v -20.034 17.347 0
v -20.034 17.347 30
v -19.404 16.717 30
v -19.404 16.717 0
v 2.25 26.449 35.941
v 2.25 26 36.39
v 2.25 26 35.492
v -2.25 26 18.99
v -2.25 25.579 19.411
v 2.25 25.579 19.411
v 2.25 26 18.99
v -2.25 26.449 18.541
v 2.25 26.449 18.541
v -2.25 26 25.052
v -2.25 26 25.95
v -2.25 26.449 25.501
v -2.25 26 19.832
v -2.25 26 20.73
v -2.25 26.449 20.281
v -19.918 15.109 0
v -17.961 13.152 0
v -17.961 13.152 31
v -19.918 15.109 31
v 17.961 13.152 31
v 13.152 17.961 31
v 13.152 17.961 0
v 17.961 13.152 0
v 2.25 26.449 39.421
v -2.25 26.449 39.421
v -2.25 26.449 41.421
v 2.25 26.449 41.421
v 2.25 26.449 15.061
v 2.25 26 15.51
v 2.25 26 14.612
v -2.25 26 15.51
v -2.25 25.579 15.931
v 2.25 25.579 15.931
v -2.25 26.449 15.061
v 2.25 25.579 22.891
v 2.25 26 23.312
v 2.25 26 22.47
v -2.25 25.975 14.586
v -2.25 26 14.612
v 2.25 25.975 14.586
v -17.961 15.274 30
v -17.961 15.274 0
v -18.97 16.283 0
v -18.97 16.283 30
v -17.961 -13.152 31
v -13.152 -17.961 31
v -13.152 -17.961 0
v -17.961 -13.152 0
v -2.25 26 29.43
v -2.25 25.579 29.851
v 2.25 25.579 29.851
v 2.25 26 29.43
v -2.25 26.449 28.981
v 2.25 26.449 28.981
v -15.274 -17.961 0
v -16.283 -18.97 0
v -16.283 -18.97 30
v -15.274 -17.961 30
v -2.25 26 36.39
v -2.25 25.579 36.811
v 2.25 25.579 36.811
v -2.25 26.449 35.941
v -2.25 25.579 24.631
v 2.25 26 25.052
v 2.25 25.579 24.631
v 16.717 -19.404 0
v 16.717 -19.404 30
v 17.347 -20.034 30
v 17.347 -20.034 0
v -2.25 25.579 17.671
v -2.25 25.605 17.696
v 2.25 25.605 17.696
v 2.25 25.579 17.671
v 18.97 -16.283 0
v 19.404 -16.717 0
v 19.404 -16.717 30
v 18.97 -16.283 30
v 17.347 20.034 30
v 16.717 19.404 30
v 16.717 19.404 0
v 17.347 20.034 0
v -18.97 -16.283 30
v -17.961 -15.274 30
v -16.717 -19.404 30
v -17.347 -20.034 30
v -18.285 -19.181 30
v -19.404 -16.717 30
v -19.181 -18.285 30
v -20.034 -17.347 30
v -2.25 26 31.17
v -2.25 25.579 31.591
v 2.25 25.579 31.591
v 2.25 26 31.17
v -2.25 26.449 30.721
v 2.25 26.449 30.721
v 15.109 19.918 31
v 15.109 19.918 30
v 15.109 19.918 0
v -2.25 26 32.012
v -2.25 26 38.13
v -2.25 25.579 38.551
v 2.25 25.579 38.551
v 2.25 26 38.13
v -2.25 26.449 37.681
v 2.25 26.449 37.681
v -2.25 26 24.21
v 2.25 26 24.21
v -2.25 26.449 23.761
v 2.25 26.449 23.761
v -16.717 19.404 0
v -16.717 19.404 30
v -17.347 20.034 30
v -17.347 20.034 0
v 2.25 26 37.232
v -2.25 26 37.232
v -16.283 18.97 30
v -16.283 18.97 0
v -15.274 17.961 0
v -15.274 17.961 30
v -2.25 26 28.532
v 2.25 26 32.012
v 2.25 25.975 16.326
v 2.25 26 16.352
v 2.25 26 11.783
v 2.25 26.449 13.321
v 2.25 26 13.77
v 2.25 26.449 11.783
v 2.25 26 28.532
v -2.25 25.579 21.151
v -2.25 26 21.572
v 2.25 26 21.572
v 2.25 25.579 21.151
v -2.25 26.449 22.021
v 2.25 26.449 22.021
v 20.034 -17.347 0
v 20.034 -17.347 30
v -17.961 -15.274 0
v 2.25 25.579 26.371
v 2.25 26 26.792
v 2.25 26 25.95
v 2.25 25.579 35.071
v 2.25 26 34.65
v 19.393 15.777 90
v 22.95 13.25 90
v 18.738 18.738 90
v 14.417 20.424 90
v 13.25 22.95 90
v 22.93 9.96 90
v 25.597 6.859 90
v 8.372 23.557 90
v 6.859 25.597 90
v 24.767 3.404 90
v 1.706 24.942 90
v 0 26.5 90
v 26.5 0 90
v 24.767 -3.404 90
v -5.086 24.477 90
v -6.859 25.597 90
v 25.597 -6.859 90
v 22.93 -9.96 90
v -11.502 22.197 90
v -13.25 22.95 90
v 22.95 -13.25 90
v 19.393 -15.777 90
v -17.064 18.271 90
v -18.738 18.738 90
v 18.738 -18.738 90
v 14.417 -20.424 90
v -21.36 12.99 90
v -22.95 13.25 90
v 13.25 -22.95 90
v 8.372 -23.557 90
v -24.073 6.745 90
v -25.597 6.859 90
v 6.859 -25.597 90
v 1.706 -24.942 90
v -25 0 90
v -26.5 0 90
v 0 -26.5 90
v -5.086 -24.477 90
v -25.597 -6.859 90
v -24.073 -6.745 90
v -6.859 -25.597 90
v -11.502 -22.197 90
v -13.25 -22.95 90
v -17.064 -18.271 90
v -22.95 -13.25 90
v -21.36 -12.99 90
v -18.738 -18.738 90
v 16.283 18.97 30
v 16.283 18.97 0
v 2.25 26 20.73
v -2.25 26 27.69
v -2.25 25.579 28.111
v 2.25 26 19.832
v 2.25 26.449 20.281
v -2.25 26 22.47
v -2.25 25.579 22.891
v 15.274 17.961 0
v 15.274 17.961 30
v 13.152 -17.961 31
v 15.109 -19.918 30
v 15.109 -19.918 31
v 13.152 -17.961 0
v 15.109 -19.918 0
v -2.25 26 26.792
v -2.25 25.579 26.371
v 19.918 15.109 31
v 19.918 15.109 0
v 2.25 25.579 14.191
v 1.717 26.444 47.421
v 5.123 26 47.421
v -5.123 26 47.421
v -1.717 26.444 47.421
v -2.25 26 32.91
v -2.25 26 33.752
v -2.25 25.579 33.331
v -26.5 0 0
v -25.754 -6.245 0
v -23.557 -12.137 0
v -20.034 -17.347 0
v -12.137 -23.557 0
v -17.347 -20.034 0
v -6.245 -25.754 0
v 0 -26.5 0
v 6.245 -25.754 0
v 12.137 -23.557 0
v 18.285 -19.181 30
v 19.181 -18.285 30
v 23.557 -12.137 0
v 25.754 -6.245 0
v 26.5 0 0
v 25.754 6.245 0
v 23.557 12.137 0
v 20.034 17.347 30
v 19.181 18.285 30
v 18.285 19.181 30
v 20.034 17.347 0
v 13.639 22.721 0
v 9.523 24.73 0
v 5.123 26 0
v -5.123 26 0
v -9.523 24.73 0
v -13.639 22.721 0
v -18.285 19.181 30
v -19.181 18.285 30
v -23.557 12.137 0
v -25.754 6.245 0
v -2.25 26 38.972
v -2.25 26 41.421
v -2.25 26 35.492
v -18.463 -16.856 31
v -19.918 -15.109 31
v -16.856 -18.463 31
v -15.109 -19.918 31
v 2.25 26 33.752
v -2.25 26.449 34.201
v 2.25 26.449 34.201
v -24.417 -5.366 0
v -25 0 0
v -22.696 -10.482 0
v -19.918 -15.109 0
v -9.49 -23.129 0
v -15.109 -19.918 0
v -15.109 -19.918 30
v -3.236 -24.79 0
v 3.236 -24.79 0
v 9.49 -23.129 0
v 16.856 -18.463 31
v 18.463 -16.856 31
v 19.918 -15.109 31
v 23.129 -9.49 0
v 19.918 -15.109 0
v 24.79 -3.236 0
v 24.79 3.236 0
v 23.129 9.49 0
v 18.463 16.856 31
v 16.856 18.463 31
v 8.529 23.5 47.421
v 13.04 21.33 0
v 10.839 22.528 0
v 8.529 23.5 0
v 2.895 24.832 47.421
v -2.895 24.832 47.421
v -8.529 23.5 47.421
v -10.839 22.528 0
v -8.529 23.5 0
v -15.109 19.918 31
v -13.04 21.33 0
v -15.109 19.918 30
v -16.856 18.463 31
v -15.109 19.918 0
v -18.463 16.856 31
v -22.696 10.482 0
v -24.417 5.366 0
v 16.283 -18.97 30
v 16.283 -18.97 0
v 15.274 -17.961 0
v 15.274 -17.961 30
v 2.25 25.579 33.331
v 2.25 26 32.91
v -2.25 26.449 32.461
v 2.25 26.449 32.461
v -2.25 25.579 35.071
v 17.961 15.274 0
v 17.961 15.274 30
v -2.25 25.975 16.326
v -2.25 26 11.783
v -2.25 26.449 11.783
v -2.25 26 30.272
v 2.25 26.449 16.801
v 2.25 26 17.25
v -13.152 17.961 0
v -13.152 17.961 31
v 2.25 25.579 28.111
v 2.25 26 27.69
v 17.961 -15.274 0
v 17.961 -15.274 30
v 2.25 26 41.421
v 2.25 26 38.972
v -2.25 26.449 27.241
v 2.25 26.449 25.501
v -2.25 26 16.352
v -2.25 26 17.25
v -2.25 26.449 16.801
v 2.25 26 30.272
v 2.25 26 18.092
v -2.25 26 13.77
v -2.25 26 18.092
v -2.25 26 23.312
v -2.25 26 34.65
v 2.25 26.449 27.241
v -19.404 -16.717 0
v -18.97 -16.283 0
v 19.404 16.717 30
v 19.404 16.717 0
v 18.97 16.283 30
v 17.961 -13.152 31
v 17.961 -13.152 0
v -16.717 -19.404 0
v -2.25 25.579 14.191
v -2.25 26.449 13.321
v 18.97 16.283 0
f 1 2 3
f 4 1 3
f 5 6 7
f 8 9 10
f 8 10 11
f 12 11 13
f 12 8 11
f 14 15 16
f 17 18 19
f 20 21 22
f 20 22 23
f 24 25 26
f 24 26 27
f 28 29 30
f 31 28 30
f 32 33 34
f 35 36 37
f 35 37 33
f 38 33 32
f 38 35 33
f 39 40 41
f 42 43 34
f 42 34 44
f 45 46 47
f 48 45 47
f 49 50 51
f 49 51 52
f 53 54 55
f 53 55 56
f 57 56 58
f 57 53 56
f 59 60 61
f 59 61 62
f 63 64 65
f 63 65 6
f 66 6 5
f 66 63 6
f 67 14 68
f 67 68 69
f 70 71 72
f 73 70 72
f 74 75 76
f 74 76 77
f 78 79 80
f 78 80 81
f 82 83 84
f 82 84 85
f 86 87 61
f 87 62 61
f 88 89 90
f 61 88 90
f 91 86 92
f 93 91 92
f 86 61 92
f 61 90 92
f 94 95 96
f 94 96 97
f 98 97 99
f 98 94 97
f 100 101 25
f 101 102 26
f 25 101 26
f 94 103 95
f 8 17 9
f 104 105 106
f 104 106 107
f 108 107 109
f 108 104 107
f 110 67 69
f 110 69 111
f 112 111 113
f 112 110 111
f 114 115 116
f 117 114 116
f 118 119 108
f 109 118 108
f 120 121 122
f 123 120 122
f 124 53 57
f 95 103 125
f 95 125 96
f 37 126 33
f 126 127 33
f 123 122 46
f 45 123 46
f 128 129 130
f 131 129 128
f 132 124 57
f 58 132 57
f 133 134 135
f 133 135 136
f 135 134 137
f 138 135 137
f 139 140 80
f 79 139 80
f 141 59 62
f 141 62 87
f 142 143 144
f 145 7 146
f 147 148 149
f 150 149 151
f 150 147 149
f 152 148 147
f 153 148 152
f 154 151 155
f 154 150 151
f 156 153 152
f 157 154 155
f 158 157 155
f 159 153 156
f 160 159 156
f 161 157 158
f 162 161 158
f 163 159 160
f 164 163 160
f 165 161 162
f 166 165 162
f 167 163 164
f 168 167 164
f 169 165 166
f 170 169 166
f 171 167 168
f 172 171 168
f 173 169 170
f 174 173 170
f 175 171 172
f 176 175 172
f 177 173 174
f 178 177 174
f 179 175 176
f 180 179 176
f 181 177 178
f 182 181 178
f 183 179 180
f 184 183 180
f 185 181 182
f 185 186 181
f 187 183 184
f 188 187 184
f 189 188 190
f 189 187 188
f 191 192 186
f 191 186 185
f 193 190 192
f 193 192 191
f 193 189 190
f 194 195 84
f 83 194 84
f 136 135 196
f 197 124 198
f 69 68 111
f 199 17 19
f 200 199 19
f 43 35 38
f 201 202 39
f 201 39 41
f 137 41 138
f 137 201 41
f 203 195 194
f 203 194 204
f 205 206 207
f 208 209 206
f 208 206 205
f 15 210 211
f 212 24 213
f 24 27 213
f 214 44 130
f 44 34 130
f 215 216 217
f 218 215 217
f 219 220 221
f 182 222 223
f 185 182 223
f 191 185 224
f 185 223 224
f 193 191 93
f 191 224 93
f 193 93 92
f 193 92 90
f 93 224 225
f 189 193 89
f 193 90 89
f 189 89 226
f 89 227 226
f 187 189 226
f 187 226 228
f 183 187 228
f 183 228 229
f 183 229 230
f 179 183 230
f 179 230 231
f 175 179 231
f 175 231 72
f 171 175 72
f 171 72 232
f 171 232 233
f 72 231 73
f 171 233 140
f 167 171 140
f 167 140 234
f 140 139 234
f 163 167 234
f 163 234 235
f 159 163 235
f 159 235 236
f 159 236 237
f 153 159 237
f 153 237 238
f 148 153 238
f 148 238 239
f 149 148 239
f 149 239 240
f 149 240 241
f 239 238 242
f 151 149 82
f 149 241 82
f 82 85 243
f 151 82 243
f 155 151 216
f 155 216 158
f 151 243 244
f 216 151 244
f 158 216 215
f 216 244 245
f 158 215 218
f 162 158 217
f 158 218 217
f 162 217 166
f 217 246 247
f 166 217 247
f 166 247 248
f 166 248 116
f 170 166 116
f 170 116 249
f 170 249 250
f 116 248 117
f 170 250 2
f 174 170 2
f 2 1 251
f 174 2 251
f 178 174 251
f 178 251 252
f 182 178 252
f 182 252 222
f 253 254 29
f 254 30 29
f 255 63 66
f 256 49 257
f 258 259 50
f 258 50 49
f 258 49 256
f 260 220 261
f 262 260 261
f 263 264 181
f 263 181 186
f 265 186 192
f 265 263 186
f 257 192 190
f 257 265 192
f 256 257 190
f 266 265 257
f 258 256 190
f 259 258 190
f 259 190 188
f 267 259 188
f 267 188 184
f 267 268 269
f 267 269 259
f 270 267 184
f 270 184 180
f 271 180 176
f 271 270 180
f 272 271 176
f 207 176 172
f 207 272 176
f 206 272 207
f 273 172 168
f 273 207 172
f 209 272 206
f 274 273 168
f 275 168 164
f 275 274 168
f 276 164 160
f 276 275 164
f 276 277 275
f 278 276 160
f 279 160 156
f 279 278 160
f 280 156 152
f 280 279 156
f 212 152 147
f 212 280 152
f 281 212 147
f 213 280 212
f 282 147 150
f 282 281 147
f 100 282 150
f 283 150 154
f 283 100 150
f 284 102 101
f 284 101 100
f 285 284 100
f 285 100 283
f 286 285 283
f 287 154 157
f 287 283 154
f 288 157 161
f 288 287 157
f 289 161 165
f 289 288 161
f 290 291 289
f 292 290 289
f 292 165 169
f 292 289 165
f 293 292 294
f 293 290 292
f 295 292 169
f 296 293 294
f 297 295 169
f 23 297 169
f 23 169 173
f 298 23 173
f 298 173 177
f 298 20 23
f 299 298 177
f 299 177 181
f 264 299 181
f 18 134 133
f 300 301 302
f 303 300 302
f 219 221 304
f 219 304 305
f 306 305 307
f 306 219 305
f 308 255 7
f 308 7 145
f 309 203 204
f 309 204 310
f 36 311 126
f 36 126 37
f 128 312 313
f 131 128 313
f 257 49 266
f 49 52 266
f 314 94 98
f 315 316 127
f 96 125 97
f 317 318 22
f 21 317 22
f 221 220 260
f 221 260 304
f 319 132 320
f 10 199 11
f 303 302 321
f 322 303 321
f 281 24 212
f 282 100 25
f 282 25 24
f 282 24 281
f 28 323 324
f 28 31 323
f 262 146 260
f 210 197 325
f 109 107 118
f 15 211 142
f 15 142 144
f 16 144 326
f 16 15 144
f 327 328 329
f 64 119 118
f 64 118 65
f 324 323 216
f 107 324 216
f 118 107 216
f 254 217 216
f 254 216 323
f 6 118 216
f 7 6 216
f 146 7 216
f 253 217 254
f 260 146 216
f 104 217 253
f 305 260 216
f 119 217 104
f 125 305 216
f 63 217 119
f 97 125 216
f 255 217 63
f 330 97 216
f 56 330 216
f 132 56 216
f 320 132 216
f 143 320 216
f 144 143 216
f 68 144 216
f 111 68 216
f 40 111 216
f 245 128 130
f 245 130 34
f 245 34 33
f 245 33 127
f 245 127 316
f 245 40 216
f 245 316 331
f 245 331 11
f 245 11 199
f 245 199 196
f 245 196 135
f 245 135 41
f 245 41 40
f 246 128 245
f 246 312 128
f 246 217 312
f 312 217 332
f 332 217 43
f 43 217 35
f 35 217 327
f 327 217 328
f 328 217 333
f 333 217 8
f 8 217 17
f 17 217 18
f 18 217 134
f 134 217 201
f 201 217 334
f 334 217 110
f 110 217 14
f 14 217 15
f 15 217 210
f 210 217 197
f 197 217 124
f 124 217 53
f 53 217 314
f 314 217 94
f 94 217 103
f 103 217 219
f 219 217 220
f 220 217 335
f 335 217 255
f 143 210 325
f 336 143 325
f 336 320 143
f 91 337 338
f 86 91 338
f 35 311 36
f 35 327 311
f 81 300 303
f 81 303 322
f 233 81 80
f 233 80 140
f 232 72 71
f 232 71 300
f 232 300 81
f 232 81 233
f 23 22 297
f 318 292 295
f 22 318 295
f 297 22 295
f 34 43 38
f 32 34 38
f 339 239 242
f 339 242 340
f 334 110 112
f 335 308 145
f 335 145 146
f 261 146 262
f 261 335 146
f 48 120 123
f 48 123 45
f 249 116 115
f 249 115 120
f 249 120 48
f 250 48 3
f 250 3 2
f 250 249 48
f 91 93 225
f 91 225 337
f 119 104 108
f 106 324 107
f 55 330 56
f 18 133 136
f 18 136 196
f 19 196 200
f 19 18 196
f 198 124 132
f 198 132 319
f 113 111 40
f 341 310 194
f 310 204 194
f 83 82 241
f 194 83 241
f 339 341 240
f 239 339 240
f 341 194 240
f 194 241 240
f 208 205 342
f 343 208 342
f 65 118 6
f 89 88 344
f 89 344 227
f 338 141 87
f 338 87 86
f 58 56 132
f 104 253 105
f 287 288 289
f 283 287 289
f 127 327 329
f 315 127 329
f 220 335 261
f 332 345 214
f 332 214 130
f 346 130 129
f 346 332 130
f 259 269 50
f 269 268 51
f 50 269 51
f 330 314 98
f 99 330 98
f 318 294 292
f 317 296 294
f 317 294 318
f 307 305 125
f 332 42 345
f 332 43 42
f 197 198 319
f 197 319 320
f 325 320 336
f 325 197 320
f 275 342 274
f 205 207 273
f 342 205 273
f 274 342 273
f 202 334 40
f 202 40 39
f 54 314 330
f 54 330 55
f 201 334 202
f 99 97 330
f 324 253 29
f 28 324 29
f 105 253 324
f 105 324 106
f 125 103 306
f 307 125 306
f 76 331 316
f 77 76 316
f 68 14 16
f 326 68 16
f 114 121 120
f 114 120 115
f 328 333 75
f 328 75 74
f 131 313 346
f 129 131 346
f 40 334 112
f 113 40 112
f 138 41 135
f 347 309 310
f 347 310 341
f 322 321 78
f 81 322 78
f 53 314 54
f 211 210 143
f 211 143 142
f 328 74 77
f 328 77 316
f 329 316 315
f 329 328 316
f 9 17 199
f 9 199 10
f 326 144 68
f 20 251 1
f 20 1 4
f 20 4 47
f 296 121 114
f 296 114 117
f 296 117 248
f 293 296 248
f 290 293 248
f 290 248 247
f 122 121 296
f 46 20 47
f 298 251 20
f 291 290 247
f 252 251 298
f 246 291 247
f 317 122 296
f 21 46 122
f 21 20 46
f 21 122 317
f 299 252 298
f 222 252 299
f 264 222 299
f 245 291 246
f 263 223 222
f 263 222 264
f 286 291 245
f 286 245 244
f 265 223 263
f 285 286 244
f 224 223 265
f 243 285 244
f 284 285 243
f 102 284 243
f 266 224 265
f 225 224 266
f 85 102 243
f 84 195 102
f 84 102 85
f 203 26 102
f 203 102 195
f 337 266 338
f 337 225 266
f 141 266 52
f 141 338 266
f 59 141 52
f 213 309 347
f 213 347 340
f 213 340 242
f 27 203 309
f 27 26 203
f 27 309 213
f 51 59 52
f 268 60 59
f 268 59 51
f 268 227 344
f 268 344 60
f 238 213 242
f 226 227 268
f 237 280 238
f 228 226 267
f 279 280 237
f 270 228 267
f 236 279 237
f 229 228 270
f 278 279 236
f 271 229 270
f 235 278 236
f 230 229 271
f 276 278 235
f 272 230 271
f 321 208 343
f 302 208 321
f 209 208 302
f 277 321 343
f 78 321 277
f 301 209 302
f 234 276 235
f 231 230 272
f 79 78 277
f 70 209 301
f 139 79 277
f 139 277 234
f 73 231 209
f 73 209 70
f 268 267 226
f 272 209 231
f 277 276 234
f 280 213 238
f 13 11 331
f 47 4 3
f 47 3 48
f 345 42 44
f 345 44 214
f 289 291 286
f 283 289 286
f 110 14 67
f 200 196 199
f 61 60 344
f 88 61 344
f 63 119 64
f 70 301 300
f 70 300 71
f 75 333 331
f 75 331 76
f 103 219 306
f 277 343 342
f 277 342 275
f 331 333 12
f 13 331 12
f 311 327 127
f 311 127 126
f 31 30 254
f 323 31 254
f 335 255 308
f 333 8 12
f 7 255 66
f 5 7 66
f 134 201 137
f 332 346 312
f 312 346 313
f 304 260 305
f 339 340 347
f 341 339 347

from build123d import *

# Parameters (mm, degrees)
SKIZZE1_R                            = 26.5
SKIZZE1_R_2                          = 25
AUFSATZ_LINEAR_AUSTRAGEN1_DEPTH      = 90
SCHNITT_LINEAR_AUSTRAGEN1_DEPTH      = 98.491025228
SCHNITT_LINEAR_AUSTRAGEN1_DEPTH_BACK = 98.491025228
SKIZZE2_W                            = 47.420755097
SKIZZE2_H                            = 0.5
AUFSATZ_LINEAR_AUSTRAGEN2_DEPTH      = 47.420755097
AUFSATZ_LINEAR_AUSTRAGEN3_DEPTH      = 2.25
AUFSATZ_LINEAR_AUSTRAGEN3_DEPTH_BACK = 2.25
SCHNITT_LINEAR_AUSTRAGEN2_DEPTH      = 30
AUFSATZ_LINEAR_AUSTRAGEN4_DEPTH      = 30
AUFSATZ_LINEAR_AUSTRAGEN5_DEPTH      = 1
SPIEGELN2_COPY_1_DEPTH               = 30
SPIEGELN2_COPY_2_DEPTH               = 30
SPIEGELN2_COPY_3_DEPTH               = 1
SCHNITT_LINEAR_AUSTRAGEN3_DEPTH      = 2.25
SCHNITT_LINEAR_AUSTRAGEN3_DEPTH_BACK = 2.25


with BuildPart() as part:
    # Skizze1 → Aufsatz-Linear austragen1 (new body)
    with BuildSketch(Plane.XY):
        with Locations(Location((0, 0, 0), (0, 0, 180))):
            Circle(SKIZZE1_R)
        with Locations(Location((0, 0, 0), (0, 0, 180))):
            Circle(SKIZZE1_R_2, mode=Mode.SUBTRACT)
    extrude(amount=AUFSATZ_LINEAR_AUSTRAGEN1_DEPTH)

    # Skizze2 → Schnitt-Linear austragen1 (cut, two sides: drawn at the far end of the back side and taken through both)
    with BuildSketch(Plane(origin=(0, 0, 0), x_dir=(0, 0, -1), z_dir=(1, 0, 0)).offset(-SCHNITT_LINEAR_AUSTRAGEN1_DEPTH_BACK)):
        with Locations((-23.710377549, 26.25)):
            Rectangle(SKIZZE2_W, SKIZZE2_H)
    extrude(amount=SCHNITT_LINEAR_AUSTRAGEN1_DEPTH + SCHNITT_LINEAR_AUSTRAGEN1_DEPTH_BACK, mode=Mode.SUBTRACT)

    # Skizze4 → Aufsatz-Linear austragen2 (add)
    with BuildSketch(Plane(origin=(0, 0, 0), x_dir=(-1, 0, 0), z_dir=(0, 0, -1))):
        Polygon((8.529361055, 23.5), (-8.529361055, 23.5), (-5.360314204, 25.204344352), (5.360314204, 25.204344352), align=None)
    extrude(amount=-AUFSATZ_LINEAR_AUSTRAGEN2_DEPTH)

    # Skizze5 → Aufsatz-Linear austragen3 (add, two sides: drawn at the far end of the back side and taken through both)
    with BuildSketch(Plane(origin=(0, 0, 0), x_dir=(0, 0, -1), z_dir=(1, 0, 0)).offset(-AUFSATZ_LINEAR_AUSTRAGEN3_DEPTH_BACK)):
        Polygon((-12.029982204, 26), (-11.783333845, 26), (-11.783333845, 26.449227107), (-13.320755097, 26.449227107), (-13.769982204, 26), (-12.871527991, 26), align=None)
        Polygon((-41.420755097, 26), (-38.971527991, 26), (-39.420755097, 26.449227107), (-41.420755097, 26.449227107), align=None)
        Polygon((-38.129982204, 26), (-37.231527991, 26), (-37.680755097, 26.449227107), align=None)
        Polygon((-36.389982204, 26), (-35.491527991, 26), (-35.940755097, 26.449227107), align=None)
        Polygon((-34.649982204, 26), (-33.751527991, 26), (-34.200755097, 26.449227107), align=None)
        Polygon((-32.909982204, 26), (-32.011527991, 26), (-32.460755097, 26.449227107), align=None)
        Polygon((-31.169982204, 26), (-30.271527991, 26), (-30.720755097, 26.449227107), align=None)
        Polygon((-29.429982204, 26), (-28.531527991, 26), (-28.980755097, 26.449227107), align=None)
        Polygon((-27.689982204, 26), (-26.791527991, 26), (-27.240755097, 26.449227107), align=None)
        Polygon((-25.949982204, 26), (-25.051527991, 26), (-25.500755097, 26.449227107), align=None)
        Polygon((-24.209982204, 26), (-23.311527991, 26), (-23.760755097, 26.449227107), align=None)
        Polygon((-22.469982204, 26), (-21.571527991, 26), (-22.020755097, 26.449227107), align=None)
        Polygon((-20.729982204, 26), (-19.831527991, 26), (-20.280755097, 26.449227107), align=None)
        Polygon((-18.989982204, 26), (-18.091527991, 26), (-18.540755097, 26.449227107), align=None)
        Polygon((-17.249982204, 26), (-16.351527991, 26), (-16.800755097, 26.449227107), align=None)
        Polygon((-15.509982204, 26), (-14.611527991, 26), (-15.060755097, 26.449227107), align=None)
    extrude(amount=AUFSATZ_LINEAR_AUSTRAGEN3_DEPTH + AUFSATZ_LINEAR_AUSTRAGEN3_DEPTH_BACK)

    # Skizze6 → Schnitt-Linear austragen2 (cut)
    with BuildSketch(Plane(origin=(0, 0, 0), x_dir=(-1, 0, 0), z_dir=(0, 0, -1))):
        with BuildLine():
            Line((-16.716780274, 19.403786042), (-17.346601449, 20.033607218))
            ThreePointArc((-17.346601449, 20.033607218), (-18.738329701, 18.738329701), (-20.033607218, 17.346601449))
            Line((-20.033607218, 17.346601449), (-19.403786042, 16.716780274))
            Line((-19.403786042, 16.716780274), (-18.97004537, 16.283039601))
            ThreePointArc((-18.97004537, 16.283039601), (-17.67766953, 17.67766953), (-16.283039601, 18.97004537))
            Line((-16.283039601, 18.97004537), (-16.716780274, 19.403786042))
        make_face()
        with BuildLine():
            Line((-17.346601449, 20.033607218), (-17.394826817, 20.081832586))
            Line((-17.394826817, 20.081832586), (-18.854928678, 18.854928678))
            Line((-18.854928678, 18.854928678), (-20.081832586, 17.394826817))
            Line((-20.081832586, 17.394826817), (-20.033607218, 17.346601449))
            ThreePointArc((-20.033607218, 17.346601449), (-18.738329701, 18.738329701), (-17.346601449, 20.033607218))
        make_face()
        with BuildLine():
            Line((-15.273506474, 17.960512242), (-16.283039601, 18.97004537))
            ThreePointArc((-16.283039601, 18.97004537), (-17.67766953, 17.67766953), (-18.97004537, 16.283039601))
            Line((-18.97004537, 16.283039601), (-17.960512242, 15.273506474))
            Line((-17.960512242, 15.273506474), (-15.273506474, 17.960512242))
        make_face()
    schnitt_linear_austragen2 = extrude(amount=-SCHNITT_LINEAR_AUSTRAGEN2_DEPTH, mode=Mode.SUBTRACT)

    # Skizze6<3> → Aufsatz-Linear austragen4 (add)
    with BuildSketch(Plane(origin=(0, 0, 0), x_dir=(-1, 0, 0), z_dir=(0, 0, -1))):
        with BuildLine():
            ThreePointArc((-15.109260367, 19.917586479), (-15.703298471, 19.452671208), (-16.283039601, 18.97004537))
            Line((-16.283039601, 18.97004537), (-15.273506474, 17.960512242))
            Line((-15.273506474, 17.960512242), (-17.960512242, 15.273506474))
            Line((-17.960512242, 15.273506474), (-18.97004537, 16.283039601))
            ThreePointArc((-18.97004537, 16.283039601), (-19.452671208, 15.703298471), (-19.917586479, 15.109260367))
            Line((-19.917586479, 15.109260367), (-17.960512242, 13.15218613))
            Line((-17.960512242, 13.15218613), (-13.15218613, 17.960512242))
            Line((-13.15218613, 17.960512242), (-15.109260367, 19.917586479))
        make_face()
    aufsatz_linear_austragen4 = extrude(amount=-AUFSATZ_LINEAR_AUSTRAGEN4_DEPTH)

    # Skizze7 → Aufsatz-Linear austragen5 (add)
    with BuildSketch(Plane.XY.offset(30)):
        Polygon((13.15218613, 17.960512242), (17.960512242, 13.15218613), (19.917586479, 15.109260367), (18.25472482, 18.000193095), (15.352274142, 20.160600254), align=None)
    aufsatz_linear_austragen5 = extrude(amount=AUFSATZ_LINEAR_AUSTRAGEN5_DEPTH)

    # Spiegeln1: Schnitt-Linear austragen2, Aufsatz-Linear austragen4, Aufsatz-Linear austragen5 across plane
    add(schnitt_linear_austragen2.mirror(Plane(origin=(0, 0, 0), x_dir=(0, 0, 1), z_dir=(1, 0, 0))), mode=Mode.SUBTRACT)
    add(aufsatz_linear_austragen4.mirror(Plane(origin=(0, 0, 0), x_dir=(0, 0, 1), z_dir=(1, 0, 0))))
    add(aufsatz_linear_austragen5.mirror(Plane(origin=(0, 0, 0), x_dir=(0, 0, 1), z_dir=(1, 0, 0))))

    # Spiegeln2: Schnitt-Linear austragen2, Aufsatz-Linear austragen4, Aufsatz-Linear austragen5 across plane
    add(schnitt_linear_austragen2.mirror(Plane.ZX), mode=Mode.SUBTRACT)
    add(aufsatz_linear_austragen4.mirror(Plane.ZX))
    add(aufsatz_linear_austragen5.mirror(Plane.ZX))

    # Spiegeln2 copy 1 sketch → Spiegeln2 copy 1 (cut)
    with BuildSketch(Plane(origin=(0, 0, 0), x_dir=(1, 0, 0), z_dir=(0, 0, -1))):
        with BuildLine():
            Line((-16.716780274, 19.403786042), (-17.346601449, 20.033607218))
            ThreePointArc((-17.346601449, 20.033607218), (-18.738329701, 18.738329701), (-20.033607218, 17.346601449))
            Line((-20.033607218, 17.346601449), (-19.403786042, 16.716780274))
            Line((-19.403786042, 16.716780274), (-18.97004537, 16.283039601))
            ThreePointArc((-18.97004537, 16.283039601), (-17.67766953, 17.67766953), (-16.283039601, 18.97004537))
            Line((-16.283039601, 18.97004537), (-16.716780274, 19.403786042))
        make_face()
        with BuildLine():
            Line((-17.346601449, 20.033607218), (-17.394826817, 20.081832586))
            Line((-17.394826817, 20.081832586), (-18.854928678, 18.854928678))
            Line((-18.854928678, 18.854928678), (-20.081832586, 17.394826817))
            Line((-20.081832586, 17.394826817), (-20.033607218, 17.346601449))
            ThreePointArc((-20.033607218, 17.346601449), (-18.738329701, 18.738329701), (-17.346601449, 20.033607218))
        make_face()
        with BuildLine():
            Line((-15.273506474, 17.960512242), (-16.283039601, 18.97004537))
            ThreePointArc((-16.283039601, 18.97004537), (-17.67766953, 17.67766953), (-18.97004537, 16.283039601))
            Line((-18.97004537, 16.283039601), (-17.960512242, 15.273506474))
            Line((-17.960512242, 15.273506474), (-15.273506474, 17.960512242))
        make_face()
    extrude(amount=-SPIEGELN2_COPY_1_DEPTH, mode=Mode.SUBTRACT)

    # Spiegeln2 copy 2 sketch → Spiegeln2 copy 2 (add)
    with BuildSketch(Plane(origin=(0, 0, 0), x_dir=(1, 0, 0), z_dir=(0, 0, -1))):
        with BuildLine():
            ThreePointArc((-15.109260367, 19.917586479), (-15.703298471, 19.452671208), (-16.283039601, 18.97004537))
            Line((-16.283039601, 18.97004537), (-15.273506474, 17.960512242))
            Line((-15.273506474, 17.960512242), (-17.960512242, 15.273506474))
            Line((-17.960512242, 15.273506474), (-18.97004537, 16.283039601))
            ThreePointArc((-18.97004537, 16.283039601), (-19.452671208, 15.703298471), (-19.917586479, 15.109260367))
            Line((-19.917586479, 15.109260367), (-17.960512242, 13.15218613))
            Line((-17.960512242, 13.15218613), (-13.15218613, 17.960512242))
            Line((-13.15218613, 17.960512242), (-15.109260367, 19.917586479))
        make_face()
    extrude(amount=-SPIEGELN2_COPY_2_DEPTH)

    # Spiegeln2 copy 3 sketch → Spiegeln2 copy 3 (add)
    with BuildSketch(Plane(origin=(0, 0, 30), x_dir=(-1, 0, 0), z_dir=(0, 0, 1))):
        Polygon((13.15218613, 17.960512242), (17.960512242, 13.15218613), (19.917586479, 15.109260367), (18.25472482, 18.000193095), (15.352274142, 20.160600254), align=None)
    extrude(amount=SPIEGELN2_COPY_3_DEPTH)

    # Skizze5<3> → Schnitt-Linear austragen3 (cut, two sides: drawn at the far end of the back side and taken through both)
    with BuildSketch(Plane(origin=(0, 0, 0), x_dir=(0, 0, -1), z_dir=(1, 0, 0)).offset(-SCHNITT_LINEAR_AUSTRAGEN3_DEPTH_BACK)):
        Polygon((-38.550755097, 25.579227107), (-38.129982204, 26), (-38.971527991, 26), align=None)
        Polygon((-36.810755097, 25.579227107), (-36.389982204, 26), (-37.231527991, 26), align=None)
        Polygon((-35.070755097, 25.579227107), (-34.649982204, 26), (-35.491527991, 26), align=None)
        Polygon((-33.330755097, 25.579227107), (-32.909982204, 26), (-33.751527991, 26), align=None)
        Polygon((-31.590755097, 25.579227107), (-31.169982204, 26), (-32.011527991, 26), align=None)
        Polygon((-29.850755097, 25.579227107), (-29.429982204, 26), (-30.271527991, 26), align=None)
        Polygon((-28.110755097, 25.579227107), (-27.689982204, 26), (-28.531527991, 26), align=None)
        Polygon((-26.370755097, 25.579227107), (-25.949982204, 26), (-26.791527991, 26), align=None)
        Polygon((-24.630755097, 25.579227107), (-24.209982204, 26), (-25.051527991, 26), align=None)
        Polygon((-22.890755097, 25.579227107), (-22.469982204, 26), (-23.311527991, 26), align=None)
        Polygon((-21.150755097, 25.579227107), (-20.729982204, 26), (-21.571527991, 26), align=None)
        Polygon((-19.385368651, 25.604613553), (-18.989982204, 26), (-19.831527991, 26), (-19.410755097, 25.579227107), align=None)
        Polygon((-17.645368651, 25.604613553), (-17.249982204, 26), (-18.091527991, 26), (-17.696141544, 25.604613553), (-17.670755097, 25.579227107), align=None)
        Polygon((-15.535368651, 25.974613553), (-15.509982204, 26), (-16.351527991, 26), (-16.326141544, 25.974613553), (-15.930755097, 25.579227107), align=None)
        Polygon((-13.795368651, 25.974613553), (-13.769982204, 26), (-14.611527991, 26), (-14.586141544, 25.974613553), (-14.190755097, 25.579227107), align=None)
    extrude(amount=SCHNITT_LINEAR_AUSTRAGEN3_DEPTH + SCHNITT_LINEAR_AUSTRAGEN3_DEPTH_BACK, mode=Mode.SUBTRACT)


solid = part.part
